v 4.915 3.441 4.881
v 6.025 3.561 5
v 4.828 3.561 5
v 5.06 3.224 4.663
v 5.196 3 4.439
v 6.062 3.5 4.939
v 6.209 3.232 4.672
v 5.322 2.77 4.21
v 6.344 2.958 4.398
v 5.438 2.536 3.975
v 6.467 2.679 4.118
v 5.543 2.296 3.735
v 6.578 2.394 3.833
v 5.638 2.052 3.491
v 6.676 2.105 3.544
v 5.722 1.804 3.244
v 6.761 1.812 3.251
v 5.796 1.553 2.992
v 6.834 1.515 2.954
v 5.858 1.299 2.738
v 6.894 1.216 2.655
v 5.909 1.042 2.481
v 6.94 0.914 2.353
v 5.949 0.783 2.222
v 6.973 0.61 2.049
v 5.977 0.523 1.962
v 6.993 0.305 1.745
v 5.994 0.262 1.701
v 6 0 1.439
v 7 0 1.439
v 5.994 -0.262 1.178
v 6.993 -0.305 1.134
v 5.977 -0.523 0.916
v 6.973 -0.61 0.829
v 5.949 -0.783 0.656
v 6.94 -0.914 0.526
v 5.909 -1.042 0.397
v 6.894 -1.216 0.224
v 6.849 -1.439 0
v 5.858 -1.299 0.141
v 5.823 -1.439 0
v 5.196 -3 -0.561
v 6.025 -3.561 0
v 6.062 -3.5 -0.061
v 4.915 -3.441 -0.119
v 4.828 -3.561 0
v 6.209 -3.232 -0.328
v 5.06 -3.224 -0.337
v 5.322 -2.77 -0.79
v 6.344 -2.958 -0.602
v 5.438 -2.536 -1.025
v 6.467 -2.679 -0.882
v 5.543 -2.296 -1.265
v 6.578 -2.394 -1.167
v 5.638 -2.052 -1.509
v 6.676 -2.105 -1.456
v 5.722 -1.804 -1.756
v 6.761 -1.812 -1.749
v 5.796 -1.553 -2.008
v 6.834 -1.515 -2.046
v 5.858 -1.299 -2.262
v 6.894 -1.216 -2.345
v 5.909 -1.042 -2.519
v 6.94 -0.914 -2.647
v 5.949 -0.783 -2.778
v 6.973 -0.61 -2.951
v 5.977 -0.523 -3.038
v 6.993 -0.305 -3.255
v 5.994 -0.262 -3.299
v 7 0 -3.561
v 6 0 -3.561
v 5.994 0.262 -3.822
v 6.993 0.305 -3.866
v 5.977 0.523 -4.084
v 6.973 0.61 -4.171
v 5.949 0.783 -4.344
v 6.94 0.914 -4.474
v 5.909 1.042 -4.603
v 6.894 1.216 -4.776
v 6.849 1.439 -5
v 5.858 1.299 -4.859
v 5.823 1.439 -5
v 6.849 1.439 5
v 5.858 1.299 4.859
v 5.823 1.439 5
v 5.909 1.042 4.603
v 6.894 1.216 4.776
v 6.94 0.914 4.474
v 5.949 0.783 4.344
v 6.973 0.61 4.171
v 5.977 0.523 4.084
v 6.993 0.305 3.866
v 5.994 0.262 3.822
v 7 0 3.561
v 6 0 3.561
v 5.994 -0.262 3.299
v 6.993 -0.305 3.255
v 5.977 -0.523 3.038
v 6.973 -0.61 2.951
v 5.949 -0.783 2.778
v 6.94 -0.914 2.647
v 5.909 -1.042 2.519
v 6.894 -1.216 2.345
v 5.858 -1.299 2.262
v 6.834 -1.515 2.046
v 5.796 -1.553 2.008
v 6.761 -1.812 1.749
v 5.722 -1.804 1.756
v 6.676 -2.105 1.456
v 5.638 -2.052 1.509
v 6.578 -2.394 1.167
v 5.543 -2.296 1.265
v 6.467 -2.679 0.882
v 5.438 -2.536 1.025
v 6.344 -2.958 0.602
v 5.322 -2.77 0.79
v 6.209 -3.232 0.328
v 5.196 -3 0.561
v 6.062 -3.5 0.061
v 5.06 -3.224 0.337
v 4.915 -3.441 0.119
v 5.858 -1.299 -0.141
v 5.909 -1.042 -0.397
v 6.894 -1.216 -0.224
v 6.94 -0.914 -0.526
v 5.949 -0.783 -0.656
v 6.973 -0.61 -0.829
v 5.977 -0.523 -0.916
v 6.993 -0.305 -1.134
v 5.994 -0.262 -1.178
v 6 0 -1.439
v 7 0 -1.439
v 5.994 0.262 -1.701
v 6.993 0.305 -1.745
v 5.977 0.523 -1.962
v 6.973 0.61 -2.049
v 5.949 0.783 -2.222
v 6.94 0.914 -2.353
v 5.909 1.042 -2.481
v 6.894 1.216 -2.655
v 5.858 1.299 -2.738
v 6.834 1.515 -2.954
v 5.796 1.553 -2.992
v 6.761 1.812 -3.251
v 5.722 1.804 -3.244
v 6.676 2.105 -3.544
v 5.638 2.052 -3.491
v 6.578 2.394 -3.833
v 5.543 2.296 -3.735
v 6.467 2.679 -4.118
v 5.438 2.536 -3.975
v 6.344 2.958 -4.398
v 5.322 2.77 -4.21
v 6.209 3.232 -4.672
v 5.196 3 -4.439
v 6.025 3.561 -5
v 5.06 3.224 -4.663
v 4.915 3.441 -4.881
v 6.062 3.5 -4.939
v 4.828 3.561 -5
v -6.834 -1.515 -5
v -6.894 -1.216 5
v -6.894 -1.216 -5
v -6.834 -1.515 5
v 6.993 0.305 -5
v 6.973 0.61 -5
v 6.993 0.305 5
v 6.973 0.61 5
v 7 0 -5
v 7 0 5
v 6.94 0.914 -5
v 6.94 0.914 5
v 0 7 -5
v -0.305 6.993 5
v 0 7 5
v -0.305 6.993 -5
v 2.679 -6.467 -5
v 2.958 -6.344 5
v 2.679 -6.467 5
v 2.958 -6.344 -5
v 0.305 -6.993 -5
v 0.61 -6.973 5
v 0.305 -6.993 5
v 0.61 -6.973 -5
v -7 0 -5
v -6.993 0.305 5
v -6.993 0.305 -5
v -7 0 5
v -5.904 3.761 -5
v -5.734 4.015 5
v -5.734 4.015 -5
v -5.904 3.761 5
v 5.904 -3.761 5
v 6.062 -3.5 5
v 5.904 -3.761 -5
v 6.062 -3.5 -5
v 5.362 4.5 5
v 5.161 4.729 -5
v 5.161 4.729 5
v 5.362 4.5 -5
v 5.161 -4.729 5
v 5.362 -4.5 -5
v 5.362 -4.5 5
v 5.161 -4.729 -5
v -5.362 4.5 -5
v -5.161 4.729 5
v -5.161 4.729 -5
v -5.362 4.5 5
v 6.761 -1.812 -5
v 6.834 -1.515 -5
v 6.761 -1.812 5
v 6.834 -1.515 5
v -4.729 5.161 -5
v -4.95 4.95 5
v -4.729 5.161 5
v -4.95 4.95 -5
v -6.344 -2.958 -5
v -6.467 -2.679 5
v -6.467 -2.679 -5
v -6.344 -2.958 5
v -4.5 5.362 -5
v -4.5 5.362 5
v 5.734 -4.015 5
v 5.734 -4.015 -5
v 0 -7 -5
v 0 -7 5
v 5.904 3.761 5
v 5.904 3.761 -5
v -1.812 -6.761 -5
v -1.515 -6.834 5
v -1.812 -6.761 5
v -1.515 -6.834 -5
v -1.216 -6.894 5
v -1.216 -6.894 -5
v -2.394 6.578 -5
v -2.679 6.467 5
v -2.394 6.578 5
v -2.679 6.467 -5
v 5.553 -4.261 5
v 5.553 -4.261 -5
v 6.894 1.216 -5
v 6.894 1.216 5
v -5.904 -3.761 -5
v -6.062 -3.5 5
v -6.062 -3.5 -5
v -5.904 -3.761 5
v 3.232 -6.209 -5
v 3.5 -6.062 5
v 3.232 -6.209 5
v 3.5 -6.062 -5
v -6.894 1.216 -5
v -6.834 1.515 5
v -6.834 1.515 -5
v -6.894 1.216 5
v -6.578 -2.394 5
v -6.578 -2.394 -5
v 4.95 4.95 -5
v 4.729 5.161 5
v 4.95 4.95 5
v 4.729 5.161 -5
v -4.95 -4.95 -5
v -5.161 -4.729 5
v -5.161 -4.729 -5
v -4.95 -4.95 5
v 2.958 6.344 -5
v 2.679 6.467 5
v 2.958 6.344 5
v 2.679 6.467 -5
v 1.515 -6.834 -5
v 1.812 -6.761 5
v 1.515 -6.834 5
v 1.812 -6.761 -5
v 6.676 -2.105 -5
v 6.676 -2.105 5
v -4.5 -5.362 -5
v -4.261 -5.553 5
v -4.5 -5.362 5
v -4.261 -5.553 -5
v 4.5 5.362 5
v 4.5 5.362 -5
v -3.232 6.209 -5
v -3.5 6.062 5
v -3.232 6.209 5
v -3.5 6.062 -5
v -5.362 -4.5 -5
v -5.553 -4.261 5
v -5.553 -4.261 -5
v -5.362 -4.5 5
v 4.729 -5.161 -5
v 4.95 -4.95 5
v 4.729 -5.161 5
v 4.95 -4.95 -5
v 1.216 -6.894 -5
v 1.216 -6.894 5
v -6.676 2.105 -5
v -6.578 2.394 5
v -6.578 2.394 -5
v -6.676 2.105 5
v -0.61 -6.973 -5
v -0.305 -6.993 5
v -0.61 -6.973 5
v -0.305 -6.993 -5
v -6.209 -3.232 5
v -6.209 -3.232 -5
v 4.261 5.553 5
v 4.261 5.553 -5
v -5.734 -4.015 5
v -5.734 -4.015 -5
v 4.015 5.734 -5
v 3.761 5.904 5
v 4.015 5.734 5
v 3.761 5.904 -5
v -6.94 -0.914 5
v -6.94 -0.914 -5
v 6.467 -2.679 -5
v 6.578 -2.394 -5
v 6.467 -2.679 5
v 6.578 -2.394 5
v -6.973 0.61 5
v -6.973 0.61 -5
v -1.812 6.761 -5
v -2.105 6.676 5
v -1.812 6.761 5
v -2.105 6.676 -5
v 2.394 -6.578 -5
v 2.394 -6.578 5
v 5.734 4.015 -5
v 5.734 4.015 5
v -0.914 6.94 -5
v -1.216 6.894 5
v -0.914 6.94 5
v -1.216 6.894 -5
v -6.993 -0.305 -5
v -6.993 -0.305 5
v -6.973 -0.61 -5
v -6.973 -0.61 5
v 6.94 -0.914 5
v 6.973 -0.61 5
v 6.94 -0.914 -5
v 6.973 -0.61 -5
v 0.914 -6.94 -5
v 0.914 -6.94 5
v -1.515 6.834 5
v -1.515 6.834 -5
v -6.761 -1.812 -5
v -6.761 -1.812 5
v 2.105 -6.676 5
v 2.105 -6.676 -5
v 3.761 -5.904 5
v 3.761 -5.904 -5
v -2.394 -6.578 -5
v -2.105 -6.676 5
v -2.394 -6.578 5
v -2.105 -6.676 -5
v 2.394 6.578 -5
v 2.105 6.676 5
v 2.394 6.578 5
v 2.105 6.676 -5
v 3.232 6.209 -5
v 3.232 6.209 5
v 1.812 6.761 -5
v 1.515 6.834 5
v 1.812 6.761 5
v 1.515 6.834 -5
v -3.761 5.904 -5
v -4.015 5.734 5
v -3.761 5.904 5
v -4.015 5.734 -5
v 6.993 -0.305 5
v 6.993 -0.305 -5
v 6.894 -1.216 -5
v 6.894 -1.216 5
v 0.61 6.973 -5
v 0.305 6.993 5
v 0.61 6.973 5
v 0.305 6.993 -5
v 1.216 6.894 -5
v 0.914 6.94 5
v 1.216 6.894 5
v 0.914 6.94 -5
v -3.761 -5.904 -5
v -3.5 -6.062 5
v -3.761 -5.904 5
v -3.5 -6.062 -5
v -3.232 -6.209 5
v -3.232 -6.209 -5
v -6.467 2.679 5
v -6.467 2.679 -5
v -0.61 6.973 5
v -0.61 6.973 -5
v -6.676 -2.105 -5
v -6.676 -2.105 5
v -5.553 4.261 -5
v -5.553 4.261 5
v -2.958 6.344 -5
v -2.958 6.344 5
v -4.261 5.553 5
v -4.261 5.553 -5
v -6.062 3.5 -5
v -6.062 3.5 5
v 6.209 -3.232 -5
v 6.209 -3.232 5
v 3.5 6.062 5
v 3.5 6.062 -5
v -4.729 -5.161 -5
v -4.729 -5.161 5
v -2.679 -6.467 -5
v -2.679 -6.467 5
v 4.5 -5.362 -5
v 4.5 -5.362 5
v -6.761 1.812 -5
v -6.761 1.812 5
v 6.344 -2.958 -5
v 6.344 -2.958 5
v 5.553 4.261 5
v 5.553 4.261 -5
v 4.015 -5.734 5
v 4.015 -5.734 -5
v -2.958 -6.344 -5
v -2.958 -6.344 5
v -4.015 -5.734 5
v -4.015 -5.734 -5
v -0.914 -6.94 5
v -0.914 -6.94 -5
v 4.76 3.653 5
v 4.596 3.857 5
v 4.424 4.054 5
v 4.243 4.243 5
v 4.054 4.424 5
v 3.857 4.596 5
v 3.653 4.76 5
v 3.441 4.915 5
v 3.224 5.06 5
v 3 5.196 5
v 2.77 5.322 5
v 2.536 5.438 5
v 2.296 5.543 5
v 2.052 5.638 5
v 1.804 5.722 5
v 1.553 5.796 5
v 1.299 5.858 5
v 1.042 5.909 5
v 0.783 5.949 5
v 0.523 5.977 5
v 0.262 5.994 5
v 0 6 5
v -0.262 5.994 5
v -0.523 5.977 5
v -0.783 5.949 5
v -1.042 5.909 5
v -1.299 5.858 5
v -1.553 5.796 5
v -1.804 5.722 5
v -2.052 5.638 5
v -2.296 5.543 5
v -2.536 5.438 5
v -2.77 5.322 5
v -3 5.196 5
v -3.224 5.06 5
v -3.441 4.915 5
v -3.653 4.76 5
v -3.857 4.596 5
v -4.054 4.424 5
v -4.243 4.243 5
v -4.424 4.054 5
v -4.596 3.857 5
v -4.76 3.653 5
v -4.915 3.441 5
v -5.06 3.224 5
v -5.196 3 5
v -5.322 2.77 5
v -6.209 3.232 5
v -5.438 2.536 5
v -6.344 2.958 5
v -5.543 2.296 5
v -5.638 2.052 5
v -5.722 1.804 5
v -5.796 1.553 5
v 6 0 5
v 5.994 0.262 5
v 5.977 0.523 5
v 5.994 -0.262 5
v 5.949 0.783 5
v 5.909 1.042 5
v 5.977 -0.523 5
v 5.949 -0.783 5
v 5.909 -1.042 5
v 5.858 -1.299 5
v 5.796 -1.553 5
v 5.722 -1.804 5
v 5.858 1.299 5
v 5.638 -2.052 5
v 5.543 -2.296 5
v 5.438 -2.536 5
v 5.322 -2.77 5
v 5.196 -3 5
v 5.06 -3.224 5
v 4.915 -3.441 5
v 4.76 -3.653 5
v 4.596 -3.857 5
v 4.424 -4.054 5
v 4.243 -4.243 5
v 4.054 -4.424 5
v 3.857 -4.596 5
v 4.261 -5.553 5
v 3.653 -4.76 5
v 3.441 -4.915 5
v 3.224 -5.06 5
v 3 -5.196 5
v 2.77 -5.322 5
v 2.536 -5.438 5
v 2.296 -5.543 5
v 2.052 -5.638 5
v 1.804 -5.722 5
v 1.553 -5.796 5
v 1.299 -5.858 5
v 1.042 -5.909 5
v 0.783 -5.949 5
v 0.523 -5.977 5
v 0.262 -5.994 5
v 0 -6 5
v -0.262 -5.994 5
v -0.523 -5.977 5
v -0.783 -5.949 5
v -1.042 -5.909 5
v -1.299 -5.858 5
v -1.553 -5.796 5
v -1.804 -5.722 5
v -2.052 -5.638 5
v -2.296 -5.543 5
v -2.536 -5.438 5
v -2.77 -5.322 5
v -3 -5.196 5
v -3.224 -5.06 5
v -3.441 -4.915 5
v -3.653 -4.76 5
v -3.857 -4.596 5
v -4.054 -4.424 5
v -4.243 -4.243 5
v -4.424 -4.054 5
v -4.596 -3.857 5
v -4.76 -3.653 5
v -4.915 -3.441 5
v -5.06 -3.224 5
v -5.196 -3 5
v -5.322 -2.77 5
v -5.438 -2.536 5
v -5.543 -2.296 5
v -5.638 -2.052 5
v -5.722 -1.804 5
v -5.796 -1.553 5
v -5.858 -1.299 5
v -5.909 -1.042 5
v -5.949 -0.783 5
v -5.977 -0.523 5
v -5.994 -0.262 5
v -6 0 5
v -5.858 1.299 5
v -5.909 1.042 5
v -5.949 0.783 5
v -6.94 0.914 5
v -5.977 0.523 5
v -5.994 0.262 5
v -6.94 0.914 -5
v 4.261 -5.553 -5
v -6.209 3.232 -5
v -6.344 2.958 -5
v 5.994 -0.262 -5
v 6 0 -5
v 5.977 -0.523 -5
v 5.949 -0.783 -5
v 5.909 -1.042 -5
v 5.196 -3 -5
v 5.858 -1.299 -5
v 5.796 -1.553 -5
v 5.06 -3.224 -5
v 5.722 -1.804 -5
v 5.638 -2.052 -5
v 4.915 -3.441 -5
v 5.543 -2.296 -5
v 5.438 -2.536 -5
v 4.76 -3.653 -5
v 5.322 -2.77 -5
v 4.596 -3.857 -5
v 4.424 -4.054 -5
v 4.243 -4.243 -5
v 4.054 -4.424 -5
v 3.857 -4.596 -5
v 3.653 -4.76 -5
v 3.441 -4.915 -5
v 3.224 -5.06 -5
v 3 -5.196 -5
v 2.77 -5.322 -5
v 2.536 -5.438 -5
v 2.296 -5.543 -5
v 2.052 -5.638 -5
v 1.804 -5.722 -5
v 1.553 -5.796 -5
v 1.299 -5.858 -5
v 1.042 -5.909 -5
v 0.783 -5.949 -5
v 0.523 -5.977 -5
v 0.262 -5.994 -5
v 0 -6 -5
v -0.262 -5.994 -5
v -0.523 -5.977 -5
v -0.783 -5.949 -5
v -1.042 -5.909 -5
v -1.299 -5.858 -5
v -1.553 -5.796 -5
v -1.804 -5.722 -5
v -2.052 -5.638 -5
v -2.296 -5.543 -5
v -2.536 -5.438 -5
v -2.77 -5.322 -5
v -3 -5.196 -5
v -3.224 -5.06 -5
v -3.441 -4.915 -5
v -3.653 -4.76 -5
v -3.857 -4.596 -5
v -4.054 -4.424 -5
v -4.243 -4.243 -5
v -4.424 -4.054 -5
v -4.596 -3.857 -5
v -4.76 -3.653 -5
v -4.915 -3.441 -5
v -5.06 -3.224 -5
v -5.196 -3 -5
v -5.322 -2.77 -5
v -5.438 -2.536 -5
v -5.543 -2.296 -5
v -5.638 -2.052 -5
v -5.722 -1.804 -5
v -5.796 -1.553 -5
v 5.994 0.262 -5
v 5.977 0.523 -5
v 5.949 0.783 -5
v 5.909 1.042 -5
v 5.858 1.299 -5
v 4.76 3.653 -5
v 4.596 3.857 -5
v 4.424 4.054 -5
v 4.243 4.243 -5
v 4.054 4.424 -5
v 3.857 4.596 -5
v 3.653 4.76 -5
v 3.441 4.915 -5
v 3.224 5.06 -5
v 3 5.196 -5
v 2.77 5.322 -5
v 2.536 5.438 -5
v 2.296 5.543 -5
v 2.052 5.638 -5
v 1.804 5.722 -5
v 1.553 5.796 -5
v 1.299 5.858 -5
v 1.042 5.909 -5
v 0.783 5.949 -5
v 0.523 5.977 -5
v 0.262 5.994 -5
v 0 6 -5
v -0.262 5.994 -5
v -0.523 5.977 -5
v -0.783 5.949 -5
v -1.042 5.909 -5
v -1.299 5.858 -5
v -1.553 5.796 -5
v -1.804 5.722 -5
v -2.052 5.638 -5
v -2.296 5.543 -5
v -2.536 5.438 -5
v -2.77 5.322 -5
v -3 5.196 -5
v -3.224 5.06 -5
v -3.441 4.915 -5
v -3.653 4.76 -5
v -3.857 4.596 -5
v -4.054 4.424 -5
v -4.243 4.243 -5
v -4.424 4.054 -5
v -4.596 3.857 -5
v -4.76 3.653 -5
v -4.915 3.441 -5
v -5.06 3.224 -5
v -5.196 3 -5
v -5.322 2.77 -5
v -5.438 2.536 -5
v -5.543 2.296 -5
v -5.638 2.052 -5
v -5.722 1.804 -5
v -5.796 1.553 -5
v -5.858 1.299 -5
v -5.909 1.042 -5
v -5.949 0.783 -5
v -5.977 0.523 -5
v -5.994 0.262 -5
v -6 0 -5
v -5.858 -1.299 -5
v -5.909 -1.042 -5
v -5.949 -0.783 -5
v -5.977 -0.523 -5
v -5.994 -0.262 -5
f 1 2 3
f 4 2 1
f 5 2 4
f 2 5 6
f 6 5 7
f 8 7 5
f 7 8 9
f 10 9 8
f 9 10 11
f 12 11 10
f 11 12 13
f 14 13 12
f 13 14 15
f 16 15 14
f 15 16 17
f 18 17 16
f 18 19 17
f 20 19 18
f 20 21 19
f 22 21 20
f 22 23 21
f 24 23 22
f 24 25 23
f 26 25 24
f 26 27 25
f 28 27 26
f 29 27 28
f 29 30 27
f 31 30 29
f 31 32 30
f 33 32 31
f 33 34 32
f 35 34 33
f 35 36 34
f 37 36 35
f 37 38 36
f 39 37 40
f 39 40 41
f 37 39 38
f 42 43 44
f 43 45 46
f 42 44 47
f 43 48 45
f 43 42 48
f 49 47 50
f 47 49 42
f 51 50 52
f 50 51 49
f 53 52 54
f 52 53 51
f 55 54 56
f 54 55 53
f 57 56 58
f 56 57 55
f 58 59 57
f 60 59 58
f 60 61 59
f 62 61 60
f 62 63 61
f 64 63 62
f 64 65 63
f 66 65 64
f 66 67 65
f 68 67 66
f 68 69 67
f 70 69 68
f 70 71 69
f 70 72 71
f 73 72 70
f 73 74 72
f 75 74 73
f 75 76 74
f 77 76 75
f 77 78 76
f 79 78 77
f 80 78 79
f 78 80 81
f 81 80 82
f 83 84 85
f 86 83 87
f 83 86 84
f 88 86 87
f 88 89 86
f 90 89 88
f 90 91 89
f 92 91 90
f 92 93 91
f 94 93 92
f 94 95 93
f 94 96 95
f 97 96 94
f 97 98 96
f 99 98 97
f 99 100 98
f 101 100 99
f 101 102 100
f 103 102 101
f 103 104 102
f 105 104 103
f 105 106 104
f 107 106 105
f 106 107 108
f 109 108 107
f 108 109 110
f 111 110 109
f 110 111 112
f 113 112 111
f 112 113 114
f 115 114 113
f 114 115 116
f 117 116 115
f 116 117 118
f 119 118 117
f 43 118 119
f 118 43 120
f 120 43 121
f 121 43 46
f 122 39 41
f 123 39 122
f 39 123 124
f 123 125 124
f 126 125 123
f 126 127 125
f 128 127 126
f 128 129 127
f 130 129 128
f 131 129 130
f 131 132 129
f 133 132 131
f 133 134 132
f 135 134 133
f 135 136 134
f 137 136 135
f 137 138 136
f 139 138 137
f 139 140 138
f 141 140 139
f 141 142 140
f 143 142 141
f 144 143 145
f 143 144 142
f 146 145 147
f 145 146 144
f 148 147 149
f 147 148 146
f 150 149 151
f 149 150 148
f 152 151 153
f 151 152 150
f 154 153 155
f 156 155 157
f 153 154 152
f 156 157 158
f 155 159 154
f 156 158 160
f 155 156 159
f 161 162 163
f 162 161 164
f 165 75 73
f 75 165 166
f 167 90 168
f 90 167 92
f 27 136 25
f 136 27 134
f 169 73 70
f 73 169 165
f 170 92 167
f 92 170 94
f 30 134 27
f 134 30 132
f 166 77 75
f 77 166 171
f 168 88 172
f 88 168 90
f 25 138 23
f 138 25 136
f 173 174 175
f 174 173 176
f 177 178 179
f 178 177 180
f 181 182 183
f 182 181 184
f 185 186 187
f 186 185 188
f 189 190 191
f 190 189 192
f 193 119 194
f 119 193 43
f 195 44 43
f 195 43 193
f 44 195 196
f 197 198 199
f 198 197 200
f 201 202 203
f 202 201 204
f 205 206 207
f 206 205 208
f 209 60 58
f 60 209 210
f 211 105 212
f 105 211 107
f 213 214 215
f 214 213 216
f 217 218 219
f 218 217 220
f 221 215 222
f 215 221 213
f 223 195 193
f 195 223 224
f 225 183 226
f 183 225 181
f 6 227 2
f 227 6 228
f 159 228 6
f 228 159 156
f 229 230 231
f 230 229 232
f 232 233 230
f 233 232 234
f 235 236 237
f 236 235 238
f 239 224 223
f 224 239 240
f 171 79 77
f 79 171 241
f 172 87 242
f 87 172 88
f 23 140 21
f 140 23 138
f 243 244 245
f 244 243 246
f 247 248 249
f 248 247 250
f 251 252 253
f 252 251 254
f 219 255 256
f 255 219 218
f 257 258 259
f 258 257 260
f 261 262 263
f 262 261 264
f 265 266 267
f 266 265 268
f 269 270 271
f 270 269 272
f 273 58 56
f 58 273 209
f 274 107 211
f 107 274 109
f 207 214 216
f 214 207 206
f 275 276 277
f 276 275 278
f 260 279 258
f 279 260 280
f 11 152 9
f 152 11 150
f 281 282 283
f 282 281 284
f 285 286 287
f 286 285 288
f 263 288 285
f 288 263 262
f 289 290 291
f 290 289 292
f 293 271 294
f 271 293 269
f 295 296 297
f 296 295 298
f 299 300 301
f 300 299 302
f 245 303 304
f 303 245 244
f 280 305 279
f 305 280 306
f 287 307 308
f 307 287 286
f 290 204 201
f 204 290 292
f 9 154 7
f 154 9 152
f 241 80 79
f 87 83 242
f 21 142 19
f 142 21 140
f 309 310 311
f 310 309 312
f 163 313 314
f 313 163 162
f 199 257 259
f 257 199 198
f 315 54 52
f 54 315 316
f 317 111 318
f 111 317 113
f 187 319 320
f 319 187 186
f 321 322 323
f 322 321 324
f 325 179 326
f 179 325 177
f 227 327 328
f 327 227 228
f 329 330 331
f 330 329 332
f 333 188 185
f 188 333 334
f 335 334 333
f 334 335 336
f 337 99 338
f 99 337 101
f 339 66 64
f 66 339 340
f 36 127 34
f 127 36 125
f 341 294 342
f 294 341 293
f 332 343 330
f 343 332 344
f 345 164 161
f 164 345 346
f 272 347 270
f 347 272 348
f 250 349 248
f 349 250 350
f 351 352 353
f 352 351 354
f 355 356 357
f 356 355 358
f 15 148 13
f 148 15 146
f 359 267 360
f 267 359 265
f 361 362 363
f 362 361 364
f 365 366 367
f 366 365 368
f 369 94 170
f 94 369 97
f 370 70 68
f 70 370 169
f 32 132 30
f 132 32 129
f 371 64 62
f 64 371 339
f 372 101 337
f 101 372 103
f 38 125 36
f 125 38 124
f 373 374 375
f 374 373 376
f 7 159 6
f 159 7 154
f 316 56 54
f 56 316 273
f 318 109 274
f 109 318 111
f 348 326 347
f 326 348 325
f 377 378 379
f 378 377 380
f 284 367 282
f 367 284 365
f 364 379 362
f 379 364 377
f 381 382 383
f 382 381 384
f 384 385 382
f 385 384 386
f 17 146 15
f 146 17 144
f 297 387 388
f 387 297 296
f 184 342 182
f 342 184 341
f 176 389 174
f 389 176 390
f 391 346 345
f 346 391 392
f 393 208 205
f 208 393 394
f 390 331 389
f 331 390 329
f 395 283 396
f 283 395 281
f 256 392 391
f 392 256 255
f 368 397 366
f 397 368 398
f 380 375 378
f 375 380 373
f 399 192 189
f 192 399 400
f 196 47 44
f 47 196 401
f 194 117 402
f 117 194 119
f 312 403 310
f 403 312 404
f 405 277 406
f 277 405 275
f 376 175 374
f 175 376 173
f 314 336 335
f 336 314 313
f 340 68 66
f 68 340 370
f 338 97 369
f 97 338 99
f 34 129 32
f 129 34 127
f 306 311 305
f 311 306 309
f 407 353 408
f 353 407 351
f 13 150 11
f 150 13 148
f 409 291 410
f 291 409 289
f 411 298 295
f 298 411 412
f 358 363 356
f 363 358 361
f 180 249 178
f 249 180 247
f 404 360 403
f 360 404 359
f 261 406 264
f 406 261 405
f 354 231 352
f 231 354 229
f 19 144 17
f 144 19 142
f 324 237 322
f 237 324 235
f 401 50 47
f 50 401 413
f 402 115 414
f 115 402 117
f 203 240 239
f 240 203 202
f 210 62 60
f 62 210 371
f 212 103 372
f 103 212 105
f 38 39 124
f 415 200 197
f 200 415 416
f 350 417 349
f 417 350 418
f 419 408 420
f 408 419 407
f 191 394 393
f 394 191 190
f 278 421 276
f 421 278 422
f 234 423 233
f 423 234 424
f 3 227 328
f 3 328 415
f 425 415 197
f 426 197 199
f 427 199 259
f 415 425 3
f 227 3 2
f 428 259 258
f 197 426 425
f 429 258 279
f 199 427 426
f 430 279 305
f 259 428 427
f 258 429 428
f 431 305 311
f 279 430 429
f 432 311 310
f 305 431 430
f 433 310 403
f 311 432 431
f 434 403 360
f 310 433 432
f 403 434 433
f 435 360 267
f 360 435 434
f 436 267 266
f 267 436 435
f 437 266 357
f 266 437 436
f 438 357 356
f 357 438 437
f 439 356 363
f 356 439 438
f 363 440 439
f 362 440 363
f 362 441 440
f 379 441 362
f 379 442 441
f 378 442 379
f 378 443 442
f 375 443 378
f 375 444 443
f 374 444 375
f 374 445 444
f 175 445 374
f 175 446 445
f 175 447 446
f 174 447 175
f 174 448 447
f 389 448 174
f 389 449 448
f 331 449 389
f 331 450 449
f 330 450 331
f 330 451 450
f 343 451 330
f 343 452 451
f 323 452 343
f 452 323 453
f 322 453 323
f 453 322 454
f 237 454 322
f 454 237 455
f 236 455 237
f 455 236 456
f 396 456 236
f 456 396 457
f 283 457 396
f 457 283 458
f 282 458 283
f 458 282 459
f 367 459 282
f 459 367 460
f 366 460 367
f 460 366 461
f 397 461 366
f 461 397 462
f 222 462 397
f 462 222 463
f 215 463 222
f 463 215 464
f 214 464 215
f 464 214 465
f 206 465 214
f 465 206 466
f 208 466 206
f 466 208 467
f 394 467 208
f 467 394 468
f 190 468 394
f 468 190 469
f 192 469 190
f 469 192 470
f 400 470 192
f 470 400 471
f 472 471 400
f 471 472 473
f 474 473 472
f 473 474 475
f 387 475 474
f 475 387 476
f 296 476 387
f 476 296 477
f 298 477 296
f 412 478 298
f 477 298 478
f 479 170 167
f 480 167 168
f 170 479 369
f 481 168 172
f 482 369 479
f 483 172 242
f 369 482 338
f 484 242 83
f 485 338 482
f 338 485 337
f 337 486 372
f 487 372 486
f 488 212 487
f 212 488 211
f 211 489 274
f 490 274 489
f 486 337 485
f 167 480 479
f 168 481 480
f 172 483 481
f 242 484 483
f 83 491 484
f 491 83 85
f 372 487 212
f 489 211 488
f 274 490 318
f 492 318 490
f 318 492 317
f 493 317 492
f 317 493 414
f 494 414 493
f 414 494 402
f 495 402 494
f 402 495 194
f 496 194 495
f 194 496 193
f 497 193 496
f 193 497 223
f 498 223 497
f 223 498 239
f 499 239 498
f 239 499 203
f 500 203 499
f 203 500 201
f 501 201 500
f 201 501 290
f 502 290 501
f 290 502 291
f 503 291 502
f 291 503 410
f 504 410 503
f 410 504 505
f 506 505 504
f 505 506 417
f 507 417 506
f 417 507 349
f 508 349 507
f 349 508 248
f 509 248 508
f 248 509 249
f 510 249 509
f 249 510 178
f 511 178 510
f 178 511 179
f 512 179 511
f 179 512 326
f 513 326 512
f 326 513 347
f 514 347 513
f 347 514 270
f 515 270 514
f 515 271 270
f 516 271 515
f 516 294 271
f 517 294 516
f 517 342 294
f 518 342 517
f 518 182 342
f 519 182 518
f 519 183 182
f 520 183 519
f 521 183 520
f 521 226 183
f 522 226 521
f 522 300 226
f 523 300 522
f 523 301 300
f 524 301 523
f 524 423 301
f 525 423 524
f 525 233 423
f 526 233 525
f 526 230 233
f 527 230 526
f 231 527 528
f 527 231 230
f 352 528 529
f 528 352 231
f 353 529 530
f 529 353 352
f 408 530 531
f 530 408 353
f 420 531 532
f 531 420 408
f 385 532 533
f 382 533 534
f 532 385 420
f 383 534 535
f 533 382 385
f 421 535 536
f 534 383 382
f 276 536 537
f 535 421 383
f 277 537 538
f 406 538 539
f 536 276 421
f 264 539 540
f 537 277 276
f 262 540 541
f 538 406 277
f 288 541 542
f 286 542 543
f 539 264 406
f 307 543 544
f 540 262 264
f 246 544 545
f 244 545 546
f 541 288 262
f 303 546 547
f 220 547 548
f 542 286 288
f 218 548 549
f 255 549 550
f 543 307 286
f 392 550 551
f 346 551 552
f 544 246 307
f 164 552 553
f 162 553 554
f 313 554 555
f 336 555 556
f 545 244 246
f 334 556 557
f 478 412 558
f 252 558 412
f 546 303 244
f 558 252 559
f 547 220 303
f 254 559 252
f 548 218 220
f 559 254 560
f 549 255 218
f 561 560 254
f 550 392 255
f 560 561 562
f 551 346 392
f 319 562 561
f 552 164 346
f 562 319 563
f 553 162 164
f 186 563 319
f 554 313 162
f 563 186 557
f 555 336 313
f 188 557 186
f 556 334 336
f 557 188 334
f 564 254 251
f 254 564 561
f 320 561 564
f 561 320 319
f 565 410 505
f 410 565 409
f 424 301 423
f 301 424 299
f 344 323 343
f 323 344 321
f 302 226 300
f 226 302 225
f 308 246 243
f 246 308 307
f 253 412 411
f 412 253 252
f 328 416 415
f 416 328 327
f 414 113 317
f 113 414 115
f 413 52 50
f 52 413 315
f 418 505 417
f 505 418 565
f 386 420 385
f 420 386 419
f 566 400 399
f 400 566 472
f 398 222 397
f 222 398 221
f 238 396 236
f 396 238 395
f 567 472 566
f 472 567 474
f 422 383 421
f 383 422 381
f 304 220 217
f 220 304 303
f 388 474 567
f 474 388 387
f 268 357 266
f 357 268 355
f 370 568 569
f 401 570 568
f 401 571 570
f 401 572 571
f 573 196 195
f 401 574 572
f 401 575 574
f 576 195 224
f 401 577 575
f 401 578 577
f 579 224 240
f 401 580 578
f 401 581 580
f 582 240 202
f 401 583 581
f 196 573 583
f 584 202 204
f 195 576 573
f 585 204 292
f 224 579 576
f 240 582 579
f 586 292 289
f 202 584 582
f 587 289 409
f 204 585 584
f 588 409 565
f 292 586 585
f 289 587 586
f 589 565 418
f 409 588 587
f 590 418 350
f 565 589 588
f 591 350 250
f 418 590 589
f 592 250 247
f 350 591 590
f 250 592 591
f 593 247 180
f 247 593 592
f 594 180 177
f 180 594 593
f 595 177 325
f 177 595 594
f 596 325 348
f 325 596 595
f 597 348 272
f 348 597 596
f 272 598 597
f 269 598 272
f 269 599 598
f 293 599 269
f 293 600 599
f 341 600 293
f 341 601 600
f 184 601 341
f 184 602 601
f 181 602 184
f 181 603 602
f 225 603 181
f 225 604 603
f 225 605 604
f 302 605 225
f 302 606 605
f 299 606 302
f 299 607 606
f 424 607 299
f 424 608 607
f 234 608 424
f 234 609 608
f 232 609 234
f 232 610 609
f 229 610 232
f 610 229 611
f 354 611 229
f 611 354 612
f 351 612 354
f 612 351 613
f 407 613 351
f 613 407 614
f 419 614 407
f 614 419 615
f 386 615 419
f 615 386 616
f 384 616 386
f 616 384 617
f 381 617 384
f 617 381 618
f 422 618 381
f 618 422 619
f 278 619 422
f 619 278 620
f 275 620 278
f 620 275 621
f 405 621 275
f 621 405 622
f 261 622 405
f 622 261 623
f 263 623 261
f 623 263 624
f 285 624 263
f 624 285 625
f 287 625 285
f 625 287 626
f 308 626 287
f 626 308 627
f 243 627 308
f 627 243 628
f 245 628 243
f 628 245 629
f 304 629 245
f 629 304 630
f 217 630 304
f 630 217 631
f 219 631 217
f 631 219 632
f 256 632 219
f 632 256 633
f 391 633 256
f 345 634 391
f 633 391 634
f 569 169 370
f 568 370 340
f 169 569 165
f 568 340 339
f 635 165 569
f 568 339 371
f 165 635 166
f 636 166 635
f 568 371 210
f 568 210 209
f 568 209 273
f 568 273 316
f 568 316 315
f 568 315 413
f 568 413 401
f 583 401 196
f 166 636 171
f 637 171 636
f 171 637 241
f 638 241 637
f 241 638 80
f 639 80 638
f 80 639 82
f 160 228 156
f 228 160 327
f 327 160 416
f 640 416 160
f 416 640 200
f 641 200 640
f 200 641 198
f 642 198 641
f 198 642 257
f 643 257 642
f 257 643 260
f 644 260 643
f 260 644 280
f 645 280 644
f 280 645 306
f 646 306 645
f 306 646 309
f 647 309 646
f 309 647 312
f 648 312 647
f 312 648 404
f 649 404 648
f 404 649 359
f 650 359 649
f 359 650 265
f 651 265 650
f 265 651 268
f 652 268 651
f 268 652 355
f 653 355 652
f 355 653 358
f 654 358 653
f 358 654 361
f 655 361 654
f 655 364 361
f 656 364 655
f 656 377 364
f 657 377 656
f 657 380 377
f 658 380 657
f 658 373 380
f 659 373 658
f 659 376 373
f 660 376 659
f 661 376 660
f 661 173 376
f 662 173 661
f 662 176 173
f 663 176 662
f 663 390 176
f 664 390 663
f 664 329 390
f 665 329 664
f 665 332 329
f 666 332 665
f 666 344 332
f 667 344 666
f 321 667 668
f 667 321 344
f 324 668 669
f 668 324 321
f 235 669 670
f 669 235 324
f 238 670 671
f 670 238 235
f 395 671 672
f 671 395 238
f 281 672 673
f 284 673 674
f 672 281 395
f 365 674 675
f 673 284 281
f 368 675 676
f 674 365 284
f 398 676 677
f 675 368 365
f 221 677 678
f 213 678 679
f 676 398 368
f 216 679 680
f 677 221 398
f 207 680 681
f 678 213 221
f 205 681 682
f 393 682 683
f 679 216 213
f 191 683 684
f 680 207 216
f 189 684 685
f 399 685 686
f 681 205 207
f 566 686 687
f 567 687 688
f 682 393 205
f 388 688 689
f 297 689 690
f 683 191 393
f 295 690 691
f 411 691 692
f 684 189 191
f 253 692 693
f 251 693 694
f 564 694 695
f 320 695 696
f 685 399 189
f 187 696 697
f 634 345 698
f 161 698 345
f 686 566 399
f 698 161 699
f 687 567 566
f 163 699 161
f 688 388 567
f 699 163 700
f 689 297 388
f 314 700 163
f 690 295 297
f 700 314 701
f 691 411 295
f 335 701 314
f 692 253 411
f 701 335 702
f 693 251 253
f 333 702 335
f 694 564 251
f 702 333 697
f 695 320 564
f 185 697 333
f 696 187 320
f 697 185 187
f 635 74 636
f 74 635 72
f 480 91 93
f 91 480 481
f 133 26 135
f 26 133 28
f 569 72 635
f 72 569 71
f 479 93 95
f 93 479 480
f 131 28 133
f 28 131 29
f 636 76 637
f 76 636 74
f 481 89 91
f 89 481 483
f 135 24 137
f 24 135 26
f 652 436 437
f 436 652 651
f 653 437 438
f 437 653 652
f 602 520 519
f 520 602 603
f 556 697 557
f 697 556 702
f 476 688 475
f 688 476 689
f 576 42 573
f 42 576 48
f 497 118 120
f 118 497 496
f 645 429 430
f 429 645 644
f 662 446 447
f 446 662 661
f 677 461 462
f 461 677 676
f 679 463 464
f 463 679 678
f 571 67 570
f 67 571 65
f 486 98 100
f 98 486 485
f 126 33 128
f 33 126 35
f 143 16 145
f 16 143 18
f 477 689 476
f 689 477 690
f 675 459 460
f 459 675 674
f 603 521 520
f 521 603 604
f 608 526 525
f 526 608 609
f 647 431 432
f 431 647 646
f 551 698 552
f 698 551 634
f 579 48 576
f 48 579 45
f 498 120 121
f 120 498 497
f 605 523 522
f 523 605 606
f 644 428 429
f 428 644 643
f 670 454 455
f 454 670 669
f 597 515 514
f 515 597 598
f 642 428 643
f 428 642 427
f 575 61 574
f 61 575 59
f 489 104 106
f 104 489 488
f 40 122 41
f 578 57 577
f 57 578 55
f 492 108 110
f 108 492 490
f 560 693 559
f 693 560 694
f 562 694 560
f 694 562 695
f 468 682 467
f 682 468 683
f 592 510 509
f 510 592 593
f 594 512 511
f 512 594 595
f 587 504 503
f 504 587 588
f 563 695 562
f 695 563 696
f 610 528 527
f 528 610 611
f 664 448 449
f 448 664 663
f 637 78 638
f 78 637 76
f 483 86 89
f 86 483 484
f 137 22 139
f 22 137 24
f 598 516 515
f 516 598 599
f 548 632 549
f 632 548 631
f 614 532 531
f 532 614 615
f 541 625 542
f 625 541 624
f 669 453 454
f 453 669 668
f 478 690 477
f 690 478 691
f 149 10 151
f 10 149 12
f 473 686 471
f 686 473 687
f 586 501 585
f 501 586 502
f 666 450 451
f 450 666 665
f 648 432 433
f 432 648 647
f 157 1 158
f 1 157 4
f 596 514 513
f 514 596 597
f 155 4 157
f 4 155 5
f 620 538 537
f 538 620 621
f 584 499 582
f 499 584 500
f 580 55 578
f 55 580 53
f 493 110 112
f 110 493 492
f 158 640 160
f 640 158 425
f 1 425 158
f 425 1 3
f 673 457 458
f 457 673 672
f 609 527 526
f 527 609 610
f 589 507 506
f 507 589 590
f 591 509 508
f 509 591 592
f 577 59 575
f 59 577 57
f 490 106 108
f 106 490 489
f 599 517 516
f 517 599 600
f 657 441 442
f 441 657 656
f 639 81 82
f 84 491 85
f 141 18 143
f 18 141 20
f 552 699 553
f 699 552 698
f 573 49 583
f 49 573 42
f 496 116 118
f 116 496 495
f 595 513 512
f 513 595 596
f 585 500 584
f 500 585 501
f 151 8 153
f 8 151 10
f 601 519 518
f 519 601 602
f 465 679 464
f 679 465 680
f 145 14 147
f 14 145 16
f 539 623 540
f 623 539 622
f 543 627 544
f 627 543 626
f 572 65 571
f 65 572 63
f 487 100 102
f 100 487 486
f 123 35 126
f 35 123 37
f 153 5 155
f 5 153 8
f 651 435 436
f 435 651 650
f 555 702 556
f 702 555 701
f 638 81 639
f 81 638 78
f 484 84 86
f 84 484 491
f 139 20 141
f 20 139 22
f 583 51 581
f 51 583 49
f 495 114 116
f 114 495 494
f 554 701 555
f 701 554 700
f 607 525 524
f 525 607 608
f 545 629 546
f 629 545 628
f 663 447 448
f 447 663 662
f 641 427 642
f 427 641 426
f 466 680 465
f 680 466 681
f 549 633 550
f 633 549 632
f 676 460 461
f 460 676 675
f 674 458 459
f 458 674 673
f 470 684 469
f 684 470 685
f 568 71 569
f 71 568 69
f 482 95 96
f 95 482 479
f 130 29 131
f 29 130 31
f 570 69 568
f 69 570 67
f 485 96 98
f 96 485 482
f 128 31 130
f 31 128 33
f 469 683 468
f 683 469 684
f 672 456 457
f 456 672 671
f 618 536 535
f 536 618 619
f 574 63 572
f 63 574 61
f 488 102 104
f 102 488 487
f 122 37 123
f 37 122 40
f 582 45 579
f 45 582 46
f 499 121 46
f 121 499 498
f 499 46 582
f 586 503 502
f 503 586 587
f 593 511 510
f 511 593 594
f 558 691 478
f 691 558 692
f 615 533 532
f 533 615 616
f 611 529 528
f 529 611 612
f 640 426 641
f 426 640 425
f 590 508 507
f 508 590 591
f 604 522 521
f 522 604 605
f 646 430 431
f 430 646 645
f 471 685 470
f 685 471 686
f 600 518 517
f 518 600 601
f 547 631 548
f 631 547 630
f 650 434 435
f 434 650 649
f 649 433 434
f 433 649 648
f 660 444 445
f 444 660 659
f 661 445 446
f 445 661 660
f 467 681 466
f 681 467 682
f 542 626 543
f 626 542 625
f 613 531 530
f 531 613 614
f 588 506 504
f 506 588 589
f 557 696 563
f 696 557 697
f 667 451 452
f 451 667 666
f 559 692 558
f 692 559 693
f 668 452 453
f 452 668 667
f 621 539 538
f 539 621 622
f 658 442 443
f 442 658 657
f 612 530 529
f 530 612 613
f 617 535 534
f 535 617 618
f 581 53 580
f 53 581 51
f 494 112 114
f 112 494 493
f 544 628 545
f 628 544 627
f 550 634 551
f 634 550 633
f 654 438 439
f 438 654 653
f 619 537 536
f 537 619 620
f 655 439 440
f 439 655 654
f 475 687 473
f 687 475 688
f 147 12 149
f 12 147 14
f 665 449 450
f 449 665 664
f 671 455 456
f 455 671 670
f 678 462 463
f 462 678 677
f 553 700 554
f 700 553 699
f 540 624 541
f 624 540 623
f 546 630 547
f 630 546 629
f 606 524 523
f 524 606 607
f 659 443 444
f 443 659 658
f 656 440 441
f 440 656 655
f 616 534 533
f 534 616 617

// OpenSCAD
width=12;
holeOffset = 8;
holeRadius = 2;

facets = 144;

height=10;
wrenchRadius=1.5;
wireRadius = 6;
screwRadius=4;
screwHeight=2;
wallThickness = 1;
baseThickness = 3;

cutOffset=-0.5;
cutSize=20;
cutThickness=1.5;

yScale = 1.0;

difference() {
    union() {
     //   translate([0,(baseThickness+wireRadius*yScale)/2,0])
         //   cube([(wireRadius + wallThickness)*2,
               //   baseThickness+wireRadius*yScale, height],center=true);
        
        scale([1,yScale,1])
            cylinder(r=wireRadius + wallThickness, h=height, center=true, $fn = facets);
        
 
    }  

    scale([1,yScale,1])
        cylinder(r=wireRadius, h=height+2, center=true, $fn = facets);





    translate([wireRadius,cutOffset+baseThickness-height/2,0])
        rotate([0,45,90]) {
            translate([0,0,(cutSize-cutThickness)/2])
                cube([cutThickness,wallThickness+6,cutSize], center=true);

            translate([(cutSize-cutThickness)/2,0,0])
                cube([cutSize,wallThickness+6,cutThickness], center=true);
    }
}
